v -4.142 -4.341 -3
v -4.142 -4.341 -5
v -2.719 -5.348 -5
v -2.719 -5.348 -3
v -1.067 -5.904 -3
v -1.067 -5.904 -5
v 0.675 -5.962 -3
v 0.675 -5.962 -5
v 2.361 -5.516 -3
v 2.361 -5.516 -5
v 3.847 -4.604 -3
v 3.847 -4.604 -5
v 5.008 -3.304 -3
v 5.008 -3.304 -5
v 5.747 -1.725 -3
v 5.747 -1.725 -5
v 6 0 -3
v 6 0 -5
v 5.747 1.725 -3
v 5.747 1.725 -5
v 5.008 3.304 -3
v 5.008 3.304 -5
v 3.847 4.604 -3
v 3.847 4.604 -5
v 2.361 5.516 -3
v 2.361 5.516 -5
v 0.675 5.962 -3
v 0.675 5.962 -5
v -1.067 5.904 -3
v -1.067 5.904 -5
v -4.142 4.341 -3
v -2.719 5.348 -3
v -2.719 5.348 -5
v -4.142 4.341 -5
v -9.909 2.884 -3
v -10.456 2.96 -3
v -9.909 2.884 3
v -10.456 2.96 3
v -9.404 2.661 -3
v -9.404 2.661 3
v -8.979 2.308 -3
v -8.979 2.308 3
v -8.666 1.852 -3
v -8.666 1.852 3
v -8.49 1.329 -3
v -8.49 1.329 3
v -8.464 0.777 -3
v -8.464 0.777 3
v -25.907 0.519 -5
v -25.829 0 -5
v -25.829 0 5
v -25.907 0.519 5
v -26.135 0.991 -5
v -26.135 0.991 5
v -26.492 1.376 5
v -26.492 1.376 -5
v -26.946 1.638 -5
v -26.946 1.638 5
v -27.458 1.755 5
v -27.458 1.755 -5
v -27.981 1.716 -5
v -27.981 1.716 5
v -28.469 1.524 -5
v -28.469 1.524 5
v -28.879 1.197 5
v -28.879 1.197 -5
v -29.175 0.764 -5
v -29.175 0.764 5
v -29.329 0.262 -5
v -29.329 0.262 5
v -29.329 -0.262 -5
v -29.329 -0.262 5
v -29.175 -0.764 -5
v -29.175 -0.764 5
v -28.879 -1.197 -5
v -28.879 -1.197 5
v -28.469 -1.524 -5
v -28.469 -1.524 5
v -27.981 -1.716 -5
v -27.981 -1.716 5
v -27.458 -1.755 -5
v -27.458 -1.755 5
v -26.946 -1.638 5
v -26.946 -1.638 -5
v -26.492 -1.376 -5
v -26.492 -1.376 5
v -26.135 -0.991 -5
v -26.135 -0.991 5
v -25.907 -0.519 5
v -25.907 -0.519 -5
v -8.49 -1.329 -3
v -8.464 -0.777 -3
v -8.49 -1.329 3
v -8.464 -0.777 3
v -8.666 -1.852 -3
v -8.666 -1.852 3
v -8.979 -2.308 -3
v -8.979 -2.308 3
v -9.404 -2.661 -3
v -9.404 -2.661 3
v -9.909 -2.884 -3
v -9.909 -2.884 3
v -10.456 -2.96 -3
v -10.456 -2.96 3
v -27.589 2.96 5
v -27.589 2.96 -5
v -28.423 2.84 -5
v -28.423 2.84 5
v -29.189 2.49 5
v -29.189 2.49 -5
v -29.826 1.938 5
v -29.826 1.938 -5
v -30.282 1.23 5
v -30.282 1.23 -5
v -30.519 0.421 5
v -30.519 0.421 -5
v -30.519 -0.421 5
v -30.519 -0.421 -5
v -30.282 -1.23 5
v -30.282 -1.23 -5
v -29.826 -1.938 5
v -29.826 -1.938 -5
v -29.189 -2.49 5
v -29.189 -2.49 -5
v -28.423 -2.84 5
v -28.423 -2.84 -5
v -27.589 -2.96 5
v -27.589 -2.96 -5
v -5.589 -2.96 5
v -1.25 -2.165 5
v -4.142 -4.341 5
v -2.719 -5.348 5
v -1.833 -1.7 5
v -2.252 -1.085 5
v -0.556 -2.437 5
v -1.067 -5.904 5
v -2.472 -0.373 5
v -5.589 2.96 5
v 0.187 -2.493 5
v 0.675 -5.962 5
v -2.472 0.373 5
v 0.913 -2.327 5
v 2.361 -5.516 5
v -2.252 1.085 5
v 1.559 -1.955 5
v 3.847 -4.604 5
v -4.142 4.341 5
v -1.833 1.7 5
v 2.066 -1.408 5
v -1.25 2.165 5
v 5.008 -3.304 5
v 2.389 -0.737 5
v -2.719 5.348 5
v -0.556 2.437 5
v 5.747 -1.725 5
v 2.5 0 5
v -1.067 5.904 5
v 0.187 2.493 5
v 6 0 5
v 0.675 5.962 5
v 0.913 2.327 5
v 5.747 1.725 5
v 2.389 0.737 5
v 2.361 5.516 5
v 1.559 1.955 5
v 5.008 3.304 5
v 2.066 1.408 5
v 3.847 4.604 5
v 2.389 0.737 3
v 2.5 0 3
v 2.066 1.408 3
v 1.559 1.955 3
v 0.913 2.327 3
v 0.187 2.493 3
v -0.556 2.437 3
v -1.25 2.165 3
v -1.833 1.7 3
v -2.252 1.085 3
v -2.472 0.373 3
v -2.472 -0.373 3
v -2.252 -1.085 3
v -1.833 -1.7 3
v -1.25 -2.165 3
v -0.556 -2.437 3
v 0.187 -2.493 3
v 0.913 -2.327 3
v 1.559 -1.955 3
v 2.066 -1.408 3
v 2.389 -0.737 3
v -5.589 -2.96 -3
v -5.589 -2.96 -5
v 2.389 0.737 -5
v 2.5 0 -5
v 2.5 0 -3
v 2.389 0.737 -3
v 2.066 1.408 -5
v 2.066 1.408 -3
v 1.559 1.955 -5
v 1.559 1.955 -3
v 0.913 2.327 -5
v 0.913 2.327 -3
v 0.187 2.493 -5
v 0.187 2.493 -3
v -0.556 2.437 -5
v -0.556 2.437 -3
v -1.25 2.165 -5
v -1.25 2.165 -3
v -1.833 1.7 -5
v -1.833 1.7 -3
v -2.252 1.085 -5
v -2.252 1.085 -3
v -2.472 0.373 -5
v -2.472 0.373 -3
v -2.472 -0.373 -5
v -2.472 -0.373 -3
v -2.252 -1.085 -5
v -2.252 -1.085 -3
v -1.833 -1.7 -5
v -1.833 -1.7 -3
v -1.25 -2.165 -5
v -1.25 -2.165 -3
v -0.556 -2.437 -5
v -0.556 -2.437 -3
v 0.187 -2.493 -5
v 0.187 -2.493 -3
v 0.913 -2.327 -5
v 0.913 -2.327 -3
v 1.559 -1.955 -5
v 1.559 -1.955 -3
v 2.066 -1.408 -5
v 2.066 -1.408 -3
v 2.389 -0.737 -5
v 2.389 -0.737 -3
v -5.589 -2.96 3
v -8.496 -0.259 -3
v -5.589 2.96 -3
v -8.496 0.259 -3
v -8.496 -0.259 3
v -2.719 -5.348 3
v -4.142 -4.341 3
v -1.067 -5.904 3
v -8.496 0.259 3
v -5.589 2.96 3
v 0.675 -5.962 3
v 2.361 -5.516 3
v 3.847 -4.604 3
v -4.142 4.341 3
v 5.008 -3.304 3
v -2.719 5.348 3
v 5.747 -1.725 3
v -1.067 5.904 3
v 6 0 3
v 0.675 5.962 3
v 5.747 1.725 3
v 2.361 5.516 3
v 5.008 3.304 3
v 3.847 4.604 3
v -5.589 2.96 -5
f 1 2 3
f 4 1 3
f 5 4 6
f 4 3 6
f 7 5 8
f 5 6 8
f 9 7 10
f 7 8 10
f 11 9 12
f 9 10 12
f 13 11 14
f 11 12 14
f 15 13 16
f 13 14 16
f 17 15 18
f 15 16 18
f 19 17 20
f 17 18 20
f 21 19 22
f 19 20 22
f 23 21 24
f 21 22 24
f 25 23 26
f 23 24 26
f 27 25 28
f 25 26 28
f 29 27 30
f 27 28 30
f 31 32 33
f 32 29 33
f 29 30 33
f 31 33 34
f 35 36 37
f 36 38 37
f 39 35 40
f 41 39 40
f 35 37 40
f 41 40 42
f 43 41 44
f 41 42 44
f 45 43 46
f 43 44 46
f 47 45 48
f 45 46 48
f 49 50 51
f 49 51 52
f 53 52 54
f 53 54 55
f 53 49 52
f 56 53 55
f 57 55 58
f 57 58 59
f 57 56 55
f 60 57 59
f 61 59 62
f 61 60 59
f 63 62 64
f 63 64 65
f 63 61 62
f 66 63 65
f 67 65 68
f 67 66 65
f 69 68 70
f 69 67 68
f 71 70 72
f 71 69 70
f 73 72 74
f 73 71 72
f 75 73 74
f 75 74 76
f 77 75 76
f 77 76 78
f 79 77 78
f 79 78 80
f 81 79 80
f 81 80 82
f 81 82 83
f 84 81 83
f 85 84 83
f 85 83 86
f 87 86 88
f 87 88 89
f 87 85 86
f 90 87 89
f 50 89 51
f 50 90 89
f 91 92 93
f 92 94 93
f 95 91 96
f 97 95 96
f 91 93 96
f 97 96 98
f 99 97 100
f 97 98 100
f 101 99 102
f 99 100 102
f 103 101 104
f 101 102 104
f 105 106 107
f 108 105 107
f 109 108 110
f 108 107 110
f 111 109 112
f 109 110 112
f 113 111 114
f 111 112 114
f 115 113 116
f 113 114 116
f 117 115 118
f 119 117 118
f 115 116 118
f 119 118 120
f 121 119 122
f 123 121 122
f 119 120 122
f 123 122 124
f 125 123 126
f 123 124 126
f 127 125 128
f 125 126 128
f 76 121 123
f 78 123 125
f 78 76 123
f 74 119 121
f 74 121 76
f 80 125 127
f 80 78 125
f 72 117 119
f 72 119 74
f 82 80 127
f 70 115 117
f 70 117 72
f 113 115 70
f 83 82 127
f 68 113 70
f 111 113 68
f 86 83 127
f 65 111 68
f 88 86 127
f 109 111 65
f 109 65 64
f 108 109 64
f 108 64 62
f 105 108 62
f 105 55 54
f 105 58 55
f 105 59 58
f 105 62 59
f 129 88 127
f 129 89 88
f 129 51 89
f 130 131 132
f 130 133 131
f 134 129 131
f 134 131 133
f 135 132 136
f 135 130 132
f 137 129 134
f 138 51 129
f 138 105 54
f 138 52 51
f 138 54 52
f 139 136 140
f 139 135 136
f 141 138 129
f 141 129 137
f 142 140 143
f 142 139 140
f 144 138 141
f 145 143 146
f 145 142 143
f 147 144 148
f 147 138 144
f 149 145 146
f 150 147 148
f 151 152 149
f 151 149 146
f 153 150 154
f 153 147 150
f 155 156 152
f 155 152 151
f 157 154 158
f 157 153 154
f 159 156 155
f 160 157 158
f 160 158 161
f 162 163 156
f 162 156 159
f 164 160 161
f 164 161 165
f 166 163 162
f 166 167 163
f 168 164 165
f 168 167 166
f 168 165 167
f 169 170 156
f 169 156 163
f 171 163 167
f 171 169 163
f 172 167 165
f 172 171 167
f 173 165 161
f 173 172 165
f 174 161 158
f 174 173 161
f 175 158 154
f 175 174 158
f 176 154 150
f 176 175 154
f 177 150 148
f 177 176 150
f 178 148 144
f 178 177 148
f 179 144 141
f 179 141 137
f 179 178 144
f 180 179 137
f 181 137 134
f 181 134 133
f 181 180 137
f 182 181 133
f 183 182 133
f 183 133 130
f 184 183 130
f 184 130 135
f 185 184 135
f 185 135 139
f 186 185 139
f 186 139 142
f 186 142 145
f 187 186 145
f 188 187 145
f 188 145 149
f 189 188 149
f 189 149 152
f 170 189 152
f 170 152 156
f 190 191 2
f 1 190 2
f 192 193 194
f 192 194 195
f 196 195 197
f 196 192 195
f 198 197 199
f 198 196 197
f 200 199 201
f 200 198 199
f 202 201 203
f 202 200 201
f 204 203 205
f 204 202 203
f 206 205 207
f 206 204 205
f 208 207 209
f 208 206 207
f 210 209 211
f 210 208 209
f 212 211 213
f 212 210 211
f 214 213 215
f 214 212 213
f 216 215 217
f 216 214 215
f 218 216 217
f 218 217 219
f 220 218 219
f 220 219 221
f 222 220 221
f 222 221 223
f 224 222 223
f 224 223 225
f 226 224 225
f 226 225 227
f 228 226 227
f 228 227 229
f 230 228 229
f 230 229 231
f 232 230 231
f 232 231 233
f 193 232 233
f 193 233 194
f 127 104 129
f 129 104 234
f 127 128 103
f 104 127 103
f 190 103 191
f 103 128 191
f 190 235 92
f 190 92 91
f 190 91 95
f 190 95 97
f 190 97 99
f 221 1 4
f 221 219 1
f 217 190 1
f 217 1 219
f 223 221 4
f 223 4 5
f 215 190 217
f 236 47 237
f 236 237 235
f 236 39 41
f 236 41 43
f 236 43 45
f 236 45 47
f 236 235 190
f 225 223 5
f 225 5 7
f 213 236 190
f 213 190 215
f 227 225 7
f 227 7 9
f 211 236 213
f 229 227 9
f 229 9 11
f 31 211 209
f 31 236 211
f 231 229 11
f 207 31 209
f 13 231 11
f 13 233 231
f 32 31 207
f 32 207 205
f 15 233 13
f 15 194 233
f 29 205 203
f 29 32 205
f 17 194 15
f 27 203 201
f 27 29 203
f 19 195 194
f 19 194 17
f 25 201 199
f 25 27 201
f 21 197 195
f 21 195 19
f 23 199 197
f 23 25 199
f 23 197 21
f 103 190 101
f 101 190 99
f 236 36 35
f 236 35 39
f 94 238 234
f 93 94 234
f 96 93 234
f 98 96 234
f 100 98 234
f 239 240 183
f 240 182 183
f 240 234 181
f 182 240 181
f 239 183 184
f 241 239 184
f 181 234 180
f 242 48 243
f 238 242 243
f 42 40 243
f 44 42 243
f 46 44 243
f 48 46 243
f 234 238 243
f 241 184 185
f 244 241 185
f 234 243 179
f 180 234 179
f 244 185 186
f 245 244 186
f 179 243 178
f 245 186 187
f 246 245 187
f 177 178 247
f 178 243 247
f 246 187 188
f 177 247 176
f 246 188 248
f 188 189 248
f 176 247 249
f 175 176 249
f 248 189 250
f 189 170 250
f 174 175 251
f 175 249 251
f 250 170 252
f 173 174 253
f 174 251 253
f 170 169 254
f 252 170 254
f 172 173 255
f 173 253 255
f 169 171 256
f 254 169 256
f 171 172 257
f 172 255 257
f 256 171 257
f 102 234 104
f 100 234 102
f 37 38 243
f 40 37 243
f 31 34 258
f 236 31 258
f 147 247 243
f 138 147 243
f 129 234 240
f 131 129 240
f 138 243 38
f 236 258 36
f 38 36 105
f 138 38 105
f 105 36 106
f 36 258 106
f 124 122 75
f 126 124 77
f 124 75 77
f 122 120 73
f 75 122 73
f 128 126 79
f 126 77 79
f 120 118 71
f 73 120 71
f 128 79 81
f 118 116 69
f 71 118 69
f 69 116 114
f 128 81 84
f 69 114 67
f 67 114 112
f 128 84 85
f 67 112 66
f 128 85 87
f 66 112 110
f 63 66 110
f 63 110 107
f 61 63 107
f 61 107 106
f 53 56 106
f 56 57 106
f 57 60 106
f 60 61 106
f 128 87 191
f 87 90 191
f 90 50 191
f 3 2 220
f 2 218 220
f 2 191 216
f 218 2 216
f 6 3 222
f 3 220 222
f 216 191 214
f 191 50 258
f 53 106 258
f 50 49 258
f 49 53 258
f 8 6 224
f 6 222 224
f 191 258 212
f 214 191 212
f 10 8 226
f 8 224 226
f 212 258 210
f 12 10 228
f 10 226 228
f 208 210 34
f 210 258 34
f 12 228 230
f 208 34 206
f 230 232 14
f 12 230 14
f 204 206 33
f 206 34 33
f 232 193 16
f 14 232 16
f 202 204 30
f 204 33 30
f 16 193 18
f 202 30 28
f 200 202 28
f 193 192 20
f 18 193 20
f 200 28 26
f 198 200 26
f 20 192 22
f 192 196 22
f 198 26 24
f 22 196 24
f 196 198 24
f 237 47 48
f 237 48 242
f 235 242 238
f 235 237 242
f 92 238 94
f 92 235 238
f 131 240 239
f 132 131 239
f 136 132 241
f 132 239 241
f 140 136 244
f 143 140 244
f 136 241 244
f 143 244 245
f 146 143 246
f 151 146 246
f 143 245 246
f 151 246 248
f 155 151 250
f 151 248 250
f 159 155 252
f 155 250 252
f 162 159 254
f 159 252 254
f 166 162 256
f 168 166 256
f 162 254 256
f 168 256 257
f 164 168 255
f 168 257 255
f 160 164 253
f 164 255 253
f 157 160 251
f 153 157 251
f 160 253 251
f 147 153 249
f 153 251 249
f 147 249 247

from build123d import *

# Parameters (mm, degrees)
BOSS_EXTRUDE1_DEPTH      = 5
BOSS_EXTRUDE1_DEPTH_BACK = 5
SKETCH1_R                = 1.76
SKETCH1_R_2              = 2.5
CUT_EXTRUDE1_DEPTH       = 3
CUT_EXTRUDE1_DEPTH_BACK  = 3
SKETCH1_4_R              = 8.5
SKETCH1_4_R_2            = 2.5
FILLET1_R                = 2


with BuildPart() as part:
    # Sketch1 → Boss-Extrude1 (new, two sides: drawn at the far end of the back side and taken through both)
    with BuildSketch(Plane.XY.offset(-BOSS_EXTRUDE1_DEPTH_BACK)):
        with BuildLine():
            ThreePointArc((-27.589132312, 2.96), (-30.549132312, 0), (-27.589132312, -2.96))
            Line((-27.589132312, -2.96), (-5.589132312, -2.96))
            Line((-5.589132312, -2.96), (-4.142219081, -4.340739694))
            ThreePointArc((-4.142219081, -4.340739694), (6, 0), (-4.142219081, 4.340739694))
            Line((-4.142219081, 4.340739694), (-5.589132312, 2.96))
            Line((-5.589132312, 2.96), (-27.589132312, 2.96))
        make_face()
        with Locations((-27.589132312, 0)):
            Circle(SKETCH1_R, mode=Mode.SUBTRACT)
        Circle(SKETCH1_R_2, mode=Mode.SUBTRACT)
    extrude(amount=BOSS_EXTRUDE1_DEPTH + BOSS_EXTRUDE1_DEPTH_BACK)

    # Sketch1<4> → Cut-Extrude1 (cut, two sides: drawn at the far end of the back side and taken through both)
    with BuildSketch(Plane.XY.offset(-CUT_EXTRUDE1_DEPTH_BACK)):
        Circle(SKETCH1_4_R)
        Circle(SKETCH1_4_R_2, mode=Mode.SUBTRACT)
    extrude(amount=CUT_EXTRUDE1_DEPTH + CUT_EXTRUDE1_DEPTH_BACK, mode=Mode.SUBTRACT)

    # Fillet1
    fillet1_edges = [part.edges().sort_by_distance(p)[0] for p in [
        (-7.967960843, 2.96, 0),
        (-7.967960843, -2.96, 0),
    ]]
    fillet(fillet1_edges, radius=FILLET1_R)


solid = part.part
